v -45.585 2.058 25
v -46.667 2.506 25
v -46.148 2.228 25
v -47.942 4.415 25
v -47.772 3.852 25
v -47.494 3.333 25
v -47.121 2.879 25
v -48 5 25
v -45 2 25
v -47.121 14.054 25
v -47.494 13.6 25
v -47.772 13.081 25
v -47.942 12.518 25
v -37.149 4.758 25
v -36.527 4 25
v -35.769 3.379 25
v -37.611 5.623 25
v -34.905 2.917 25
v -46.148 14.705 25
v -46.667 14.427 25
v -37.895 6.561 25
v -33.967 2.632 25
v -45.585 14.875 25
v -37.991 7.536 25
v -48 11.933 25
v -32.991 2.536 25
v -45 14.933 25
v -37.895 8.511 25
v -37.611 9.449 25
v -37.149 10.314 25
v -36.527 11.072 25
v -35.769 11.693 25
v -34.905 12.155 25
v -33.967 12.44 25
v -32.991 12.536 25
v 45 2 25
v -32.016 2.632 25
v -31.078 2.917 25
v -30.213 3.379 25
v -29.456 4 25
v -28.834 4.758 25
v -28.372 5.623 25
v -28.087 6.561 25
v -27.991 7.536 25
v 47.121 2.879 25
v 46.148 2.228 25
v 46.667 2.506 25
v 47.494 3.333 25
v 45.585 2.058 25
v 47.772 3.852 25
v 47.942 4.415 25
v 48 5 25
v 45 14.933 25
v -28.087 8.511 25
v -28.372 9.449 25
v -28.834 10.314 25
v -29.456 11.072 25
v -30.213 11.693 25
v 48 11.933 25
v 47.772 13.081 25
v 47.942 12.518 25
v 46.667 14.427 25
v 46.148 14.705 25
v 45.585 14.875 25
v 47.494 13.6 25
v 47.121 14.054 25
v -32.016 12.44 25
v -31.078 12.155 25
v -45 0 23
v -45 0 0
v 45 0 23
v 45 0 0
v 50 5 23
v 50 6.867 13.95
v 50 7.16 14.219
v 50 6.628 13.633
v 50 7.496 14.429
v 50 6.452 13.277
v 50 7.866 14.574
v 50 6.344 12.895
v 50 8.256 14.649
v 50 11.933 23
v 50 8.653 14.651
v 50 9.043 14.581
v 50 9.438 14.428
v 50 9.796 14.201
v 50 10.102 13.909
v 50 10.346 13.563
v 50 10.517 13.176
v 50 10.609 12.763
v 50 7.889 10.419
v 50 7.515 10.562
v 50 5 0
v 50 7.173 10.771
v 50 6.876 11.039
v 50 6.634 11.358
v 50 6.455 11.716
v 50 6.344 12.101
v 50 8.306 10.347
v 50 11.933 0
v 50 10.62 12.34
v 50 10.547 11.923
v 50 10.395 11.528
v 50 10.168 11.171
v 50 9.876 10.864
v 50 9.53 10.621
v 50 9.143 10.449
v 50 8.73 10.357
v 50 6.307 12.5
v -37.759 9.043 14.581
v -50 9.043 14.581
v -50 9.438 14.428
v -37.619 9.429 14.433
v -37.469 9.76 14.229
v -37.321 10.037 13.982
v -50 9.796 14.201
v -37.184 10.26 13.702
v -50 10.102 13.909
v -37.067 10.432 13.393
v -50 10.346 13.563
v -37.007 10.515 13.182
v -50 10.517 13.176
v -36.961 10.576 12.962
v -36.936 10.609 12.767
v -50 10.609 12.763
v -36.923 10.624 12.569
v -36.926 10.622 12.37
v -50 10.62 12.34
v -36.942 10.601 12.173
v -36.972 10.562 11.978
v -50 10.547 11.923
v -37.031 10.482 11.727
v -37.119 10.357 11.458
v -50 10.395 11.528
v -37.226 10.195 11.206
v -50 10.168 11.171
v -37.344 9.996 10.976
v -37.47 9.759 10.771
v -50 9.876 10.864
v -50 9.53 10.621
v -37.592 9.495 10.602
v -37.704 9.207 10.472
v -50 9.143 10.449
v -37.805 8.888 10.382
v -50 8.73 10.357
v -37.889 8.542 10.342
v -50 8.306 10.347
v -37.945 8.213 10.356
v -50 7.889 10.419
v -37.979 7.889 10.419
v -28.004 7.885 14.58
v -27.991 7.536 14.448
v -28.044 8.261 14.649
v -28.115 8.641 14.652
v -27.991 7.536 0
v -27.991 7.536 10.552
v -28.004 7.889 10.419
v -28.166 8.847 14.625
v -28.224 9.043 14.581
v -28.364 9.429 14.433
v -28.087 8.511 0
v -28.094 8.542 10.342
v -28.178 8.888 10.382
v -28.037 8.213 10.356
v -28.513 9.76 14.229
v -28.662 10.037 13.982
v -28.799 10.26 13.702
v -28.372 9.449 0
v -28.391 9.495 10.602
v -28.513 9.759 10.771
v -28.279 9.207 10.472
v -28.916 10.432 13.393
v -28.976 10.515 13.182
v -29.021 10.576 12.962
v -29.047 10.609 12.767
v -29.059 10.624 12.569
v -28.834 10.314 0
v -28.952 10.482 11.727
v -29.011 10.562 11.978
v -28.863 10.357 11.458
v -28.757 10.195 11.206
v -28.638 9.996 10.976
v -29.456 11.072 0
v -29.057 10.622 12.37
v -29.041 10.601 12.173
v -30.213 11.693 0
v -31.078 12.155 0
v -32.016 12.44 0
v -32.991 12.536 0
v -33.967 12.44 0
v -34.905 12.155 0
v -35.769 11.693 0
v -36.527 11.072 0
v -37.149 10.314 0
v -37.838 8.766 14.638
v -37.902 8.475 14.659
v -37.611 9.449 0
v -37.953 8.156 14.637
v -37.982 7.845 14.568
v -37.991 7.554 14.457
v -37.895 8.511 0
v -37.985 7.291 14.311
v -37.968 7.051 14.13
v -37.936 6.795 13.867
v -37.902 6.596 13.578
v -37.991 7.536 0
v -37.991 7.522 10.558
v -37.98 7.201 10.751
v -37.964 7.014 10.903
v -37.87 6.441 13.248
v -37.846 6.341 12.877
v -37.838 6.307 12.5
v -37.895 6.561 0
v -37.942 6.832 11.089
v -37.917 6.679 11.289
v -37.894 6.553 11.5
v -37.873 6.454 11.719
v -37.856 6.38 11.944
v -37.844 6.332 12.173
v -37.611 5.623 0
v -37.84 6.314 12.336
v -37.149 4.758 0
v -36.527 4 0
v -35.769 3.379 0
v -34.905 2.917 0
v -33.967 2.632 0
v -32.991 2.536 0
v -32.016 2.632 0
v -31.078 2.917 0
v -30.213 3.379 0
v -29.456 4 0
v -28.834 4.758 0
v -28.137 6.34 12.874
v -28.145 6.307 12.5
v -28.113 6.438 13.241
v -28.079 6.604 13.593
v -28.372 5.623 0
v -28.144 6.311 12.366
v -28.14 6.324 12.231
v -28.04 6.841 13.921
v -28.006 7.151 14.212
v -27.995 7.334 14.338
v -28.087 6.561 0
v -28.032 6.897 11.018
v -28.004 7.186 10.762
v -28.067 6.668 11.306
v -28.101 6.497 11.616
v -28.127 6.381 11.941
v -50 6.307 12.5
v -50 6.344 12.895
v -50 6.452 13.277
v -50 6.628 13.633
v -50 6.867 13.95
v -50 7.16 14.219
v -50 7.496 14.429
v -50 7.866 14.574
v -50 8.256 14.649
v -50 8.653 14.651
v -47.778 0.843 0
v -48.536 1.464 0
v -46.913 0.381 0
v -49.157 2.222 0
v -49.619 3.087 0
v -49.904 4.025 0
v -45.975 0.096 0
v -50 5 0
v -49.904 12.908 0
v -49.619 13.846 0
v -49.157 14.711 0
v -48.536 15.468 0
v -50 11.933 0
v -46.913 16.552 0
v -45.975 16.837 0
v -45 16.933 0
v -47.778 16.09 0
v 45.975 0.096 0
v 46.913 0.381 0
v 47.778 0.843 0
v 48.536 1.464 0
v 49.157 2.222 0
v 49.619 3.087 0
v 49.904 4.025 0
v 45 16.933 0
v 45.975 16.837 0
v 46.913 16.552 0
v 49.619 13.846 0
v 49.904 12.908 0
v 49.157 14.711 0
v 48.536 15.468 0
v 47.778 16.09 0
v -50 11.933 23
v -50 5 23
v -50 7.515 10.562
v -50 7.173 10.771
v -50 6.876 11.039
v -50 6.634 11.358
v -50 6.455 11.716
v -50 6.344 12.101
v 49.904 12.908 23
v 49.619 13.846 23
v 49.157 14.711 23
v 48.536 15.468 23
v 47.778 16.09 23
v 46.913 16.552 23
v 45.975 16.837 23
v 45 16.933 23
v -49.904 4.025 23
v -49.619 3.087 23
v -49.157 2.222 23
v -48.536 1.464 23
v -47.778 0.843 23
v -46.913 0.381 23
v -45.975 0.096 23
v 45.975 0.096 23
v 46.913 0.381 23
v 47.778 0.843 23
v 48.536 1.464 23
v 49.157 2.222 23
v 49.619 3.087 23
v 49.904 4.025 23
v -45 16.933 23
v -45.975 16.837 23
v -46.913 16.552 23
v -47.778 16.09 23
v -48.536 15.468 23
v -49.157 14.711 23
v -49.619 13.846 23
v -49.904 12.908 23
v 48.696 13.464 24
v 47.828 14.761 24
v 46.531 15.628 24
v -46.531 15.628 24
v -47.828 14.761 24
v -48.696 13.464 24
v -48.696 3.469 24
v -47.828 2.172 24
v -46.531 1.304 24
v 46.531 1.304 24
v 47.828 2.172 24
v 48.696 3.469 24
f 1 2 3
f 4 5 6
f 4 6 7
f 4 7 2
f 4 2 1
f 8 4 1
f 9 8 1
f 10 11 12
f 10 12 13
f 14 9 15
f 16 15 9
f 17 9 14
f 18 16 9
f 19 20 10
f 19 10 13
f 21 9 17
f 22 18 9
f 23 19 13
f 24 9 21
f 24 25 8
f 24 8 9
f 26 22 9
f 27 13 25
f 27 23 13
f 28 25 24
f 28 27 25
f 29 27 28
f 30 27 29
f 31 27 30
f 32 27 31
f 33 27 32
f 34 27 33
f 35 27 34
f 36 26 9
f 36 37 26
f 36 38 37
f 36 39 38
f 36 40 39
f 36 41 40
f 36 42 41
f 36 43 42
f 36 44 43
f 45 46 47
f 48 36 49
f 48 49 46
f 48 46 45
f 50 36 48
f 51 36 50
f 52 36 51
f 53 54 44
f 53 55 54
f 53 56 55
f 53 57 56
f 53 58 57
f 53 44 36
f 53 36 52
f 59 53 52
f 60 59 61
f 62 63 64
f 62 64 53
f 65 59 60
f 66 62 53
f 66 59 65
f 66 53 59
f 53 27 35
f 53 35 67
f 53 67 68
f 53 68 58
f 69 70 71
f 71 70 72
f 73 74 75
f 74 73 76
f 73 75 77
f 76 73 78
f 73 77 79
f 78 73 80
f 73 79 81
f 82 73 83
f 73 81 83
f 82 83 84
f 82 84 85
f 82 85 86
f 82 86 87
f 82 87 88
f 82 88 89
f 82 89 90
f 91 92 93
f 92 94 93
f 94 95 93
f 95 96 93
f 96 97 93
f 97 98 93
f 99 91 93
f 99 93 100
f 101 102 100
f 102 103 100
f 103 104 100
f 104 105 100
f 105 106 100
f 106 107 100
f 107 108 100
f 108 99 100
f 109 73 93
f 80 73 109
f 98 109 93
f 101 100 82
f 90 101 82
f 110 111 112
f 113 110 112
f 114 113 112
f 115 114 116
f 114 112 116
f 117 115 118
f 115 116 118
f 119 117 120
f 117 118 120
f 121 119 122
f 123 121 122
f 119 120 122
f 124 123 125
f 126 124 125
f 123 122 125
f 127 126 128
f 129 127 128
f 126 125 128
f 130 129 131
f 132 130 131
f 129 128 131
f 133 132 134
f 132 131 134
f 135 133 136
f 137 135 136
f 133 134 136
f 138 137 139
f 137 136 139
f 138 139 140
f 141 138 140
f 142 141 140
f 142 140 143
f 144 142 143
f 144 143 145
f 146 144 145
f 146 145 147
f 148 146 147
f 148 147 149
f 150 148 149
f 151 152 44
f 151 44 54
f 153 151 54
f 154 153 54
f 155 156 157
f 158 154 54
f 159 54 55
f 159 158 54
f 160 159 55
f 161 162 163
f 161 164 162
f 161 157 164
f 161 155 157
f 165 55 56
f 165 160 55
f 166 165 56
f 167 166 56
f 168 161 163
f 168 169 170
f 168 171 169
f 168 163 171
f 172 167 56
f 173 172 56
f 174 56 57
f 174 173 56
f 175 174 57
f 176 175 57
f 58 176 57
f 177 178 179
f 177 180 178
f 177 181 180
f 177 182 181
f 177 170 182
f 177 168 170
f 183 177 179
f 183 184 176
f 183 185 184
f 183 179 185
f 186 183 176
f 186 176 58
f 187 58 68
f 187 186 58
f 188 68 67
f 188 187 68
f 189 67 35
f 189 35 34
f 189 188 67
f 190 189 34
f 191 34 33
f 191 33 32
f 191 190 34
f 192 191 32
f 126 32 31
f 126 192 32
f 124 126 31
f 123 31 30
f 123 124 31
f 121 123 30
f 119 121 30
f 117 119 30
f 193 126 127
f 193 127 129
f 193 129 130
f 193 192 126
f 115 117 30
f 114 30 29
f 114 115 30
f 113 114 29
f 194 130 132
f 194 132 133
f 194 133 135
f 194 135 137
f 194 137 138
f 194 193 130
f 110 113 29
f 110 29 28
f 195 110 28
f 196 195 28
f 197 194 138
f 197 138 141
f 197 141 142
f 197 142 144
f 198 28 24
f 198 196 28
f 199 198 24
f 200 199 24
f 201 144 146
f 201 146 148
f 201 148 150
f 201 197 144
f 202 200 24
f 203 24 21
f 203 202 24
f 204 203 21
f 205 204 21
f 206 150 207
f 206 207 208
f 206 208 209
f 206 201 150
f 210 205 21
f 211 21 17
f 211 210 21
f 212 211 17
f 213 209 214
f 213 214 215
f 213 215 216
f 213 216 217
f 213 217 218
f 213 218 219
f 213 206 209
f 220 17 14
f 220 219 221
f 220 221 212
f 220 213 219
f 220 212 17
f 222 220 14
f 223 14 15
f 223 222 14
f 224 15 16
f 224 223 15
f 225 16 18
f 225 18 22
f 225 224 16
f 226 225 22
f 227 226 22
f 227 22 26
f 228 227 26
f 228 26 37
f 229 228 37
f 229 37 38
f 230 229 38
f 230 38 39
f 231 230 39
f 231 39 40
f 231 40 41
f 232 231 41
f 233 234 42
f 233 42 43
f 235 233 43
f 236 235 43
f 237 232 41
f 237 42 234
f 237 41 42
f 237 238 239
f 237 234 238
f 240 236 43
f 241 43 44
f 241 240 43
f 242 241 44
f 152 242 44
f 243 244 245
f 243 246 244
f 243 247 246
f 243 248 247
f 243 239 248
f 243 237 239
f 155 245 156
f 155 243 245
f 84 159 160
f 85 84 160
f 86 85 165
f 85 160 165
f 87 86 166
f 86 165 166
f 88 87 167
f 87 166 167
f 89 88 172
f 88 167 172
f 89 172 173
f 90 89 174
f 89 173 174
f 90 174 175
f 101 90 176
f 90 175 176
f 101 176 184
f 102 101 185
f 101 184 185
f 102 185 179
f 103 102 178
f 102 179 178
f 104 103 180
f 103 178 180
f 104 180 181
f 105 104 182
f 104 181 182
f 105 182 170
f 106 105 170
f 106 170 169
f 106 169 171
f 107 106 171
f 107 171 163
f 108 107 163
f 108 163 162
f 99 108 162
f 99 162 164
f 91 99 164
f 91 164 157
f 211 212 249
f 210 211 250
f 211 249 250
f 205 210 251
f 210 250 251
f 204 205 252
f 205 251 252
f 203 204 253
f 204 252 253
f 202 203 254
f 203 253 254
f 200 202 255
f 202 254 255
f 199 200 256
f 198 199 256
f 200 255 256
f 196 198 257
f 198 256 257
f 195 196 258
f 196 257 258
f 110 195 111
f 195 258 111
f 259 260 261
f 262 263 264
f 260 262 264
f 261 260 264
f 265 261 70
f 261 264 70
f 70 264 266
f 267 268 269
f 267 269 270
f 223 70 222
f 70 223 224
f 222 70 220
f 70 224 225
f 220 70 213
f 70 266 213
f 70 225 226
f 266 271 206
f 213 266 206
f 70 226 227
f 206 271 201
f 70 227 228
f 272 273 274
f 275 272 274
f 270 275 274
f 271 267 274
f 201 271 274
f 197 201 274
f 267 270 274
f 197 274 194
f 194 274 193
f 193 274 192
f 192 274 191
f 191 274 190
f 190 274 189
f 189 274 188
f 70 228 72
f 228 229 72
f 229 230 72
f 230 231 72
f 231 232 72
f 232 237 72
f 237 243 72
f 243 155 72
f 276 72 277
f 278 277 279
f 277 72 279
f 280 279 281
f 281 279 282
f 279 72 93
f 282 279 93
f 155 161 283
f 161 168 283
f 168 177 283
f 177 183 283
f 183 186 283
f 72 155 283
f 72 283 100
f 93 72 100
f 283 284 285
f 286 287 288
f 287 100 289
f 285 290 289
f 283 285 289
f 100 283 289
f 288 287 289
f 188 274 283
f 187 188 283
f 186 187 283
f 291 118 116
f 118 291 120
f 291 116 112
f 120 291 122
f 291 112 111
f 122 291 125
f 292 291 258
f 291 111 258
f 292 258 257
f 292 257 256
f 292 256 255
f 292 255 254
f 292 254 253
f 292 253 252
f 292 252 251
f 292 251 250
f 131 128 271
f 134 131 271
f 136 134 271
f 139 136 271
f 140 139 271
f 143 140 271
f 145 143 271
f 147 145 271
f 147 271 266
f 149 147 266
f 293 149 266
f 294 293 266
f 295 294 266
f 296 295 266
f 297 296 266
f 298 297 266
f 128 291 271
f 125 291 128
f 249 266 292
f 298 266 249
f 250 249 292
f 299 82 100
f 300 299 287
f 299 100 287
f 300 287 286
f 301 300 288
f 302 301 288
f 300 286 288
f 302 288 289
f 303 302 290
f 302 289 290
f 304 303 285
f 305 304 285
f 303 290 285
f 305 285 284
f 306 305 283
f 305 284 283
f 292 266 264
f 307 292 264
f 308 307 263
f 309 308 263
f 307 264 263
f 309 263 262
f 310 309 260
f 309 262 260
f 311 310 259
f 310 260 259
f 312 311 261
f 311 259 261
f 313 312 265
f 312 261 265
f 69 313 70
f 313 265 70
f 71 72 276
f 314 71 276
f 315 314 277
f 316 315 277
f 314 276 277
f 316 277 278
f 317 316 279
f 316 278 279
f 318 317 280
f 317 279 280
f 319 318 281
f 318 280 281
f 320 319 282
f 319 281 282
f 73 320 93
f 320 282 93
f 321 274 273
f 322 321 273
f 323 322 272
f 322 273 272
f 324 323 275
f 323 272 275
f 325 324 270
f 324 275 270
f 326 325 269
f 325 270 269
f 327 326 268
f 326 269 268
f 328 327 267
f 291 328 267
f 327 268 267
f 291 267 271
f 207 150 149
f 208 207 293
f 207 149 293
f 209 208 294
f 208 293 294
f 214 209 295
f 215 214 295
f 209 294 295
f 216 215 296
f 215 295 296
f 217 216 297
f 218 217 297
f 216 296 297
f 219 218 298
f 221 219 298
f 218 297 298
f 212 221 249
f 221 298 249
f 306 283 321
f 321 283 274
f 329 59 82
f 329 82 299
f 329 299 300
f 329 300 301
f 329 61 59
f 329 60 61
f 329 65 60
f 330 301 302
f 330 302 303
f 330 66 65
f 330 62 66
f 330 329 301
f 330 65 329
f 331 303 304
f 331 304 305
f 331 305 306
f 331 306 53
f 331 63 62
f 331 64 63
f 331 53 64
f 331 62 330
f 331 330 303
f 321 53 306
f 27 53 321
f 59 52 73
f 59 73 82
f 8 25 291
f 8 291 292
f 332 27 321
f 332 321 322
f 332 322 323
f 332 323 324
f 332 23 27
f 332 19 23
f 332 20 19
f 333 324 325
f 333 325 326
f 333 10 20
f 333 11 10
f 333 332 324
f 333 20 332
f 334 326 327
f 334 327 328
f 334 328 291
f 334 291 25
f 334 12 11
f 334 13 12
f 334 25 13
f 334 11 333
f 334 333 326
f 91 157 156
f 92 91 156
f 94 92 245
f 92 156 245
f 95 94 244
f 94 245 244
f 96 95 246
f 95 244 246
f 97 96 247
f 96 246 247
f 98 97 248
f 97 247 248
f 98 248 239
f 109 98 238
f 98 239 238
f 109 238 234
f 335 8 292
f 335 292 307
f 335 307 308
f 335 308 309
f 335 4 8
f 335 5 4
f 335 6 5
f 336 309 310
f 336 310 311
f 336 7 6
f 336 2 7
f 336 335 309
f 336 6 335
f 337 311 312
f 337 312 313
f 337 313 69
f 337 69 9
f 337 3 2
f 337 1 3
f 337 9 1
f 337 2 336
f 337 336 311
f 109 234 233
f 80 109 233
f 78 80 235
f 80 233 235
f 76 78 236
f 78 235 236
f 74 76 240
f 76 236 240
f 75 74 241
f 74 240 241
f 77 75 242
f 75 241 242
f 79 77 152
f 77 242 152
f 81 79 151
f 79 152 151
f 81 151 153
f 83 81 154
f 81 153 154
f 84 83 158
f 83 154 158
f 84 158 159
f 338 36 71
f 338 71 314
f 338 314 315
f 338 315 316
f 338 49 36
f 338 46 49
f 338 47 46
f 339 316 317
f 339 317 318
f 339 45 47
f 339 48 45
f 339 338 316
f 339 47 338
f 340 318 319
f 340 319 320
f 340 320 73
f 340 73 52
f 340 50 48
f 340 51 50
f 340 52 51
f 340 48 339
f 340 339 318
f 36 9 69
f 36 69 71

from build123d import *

# Parameters (mm, degrees)
F0_R     = 5
F1_DEPTH = 25
F3_DEPTH = 100.001
F4_SIZE  = 2


with BuildPart() as f1:
    # F0 (on Top) → F1 (new body)
    with BuildSketch(Plane.XY):
        with BuildLine():
            Line((45, 16.932883), (-45, 16.932883))
            ThreePointArc((-45, 16.932883), (-48.535534, 15.468417), (-50, 11.932883))
            Line((-50, 11.932883), (-50, 5))
            ThreePointArc((-50, 5), (-48.535534, 1.464466), (-45, 0))
            Line((-45, 0), (45, 0))
            ThreePointArc((45, 0), (48.535534, 1.464466), (50, 5))
            Line((50, 5), (50, 11.932883))
            ThreePointArc((50, 11.932883), (48.535534, 15.468417), (45, 16.932883))
        make_face()
        with Locations((-32.991346, 7.536008)):
            Circle(F0_R, mode=Mode.SUBTRACT)
    extrude(amount=F1_DEPTH)

    # F2 (on face) → F3 (cut, through all)
    with BuildSketch(Plane(origin=(-50, 0, 0), x_dir=(0, -1, 0), z_dir=(-1, 0, 0))):
        with BuildLine():
            ThreePointArc((-7.88945, 10.419369), (-6.747756, 11.19307), (-6.307288, 12.5))
            ThreePointArc((-6.307288, 12.5), (-7.159511, 14.218685), (-9.043432, 14.580631))
            Line((-9.043432, 14.580631), (-7.88945, 10.419369))
        make_face()
        with BuildLine():
            Line((-7.88945, 10.419369), (-9.043432, 14.580631))
            ThreePointArc((-9.043432, 14.580631), (-10.547073, 11.923009), (-7.88945, 10.419369))
        make_face()
    extrude(amount=-F3_DEPTH, mode=Mode.SUBTRACT)

    # F4
    f4_edges = [f1.edges().sort_by_distance(p)[0] for p in [
        (0, 16.932883, 25),
    ]]
    chamfer(f4_edges, length=F4_SIZE)


solid = f1.part
